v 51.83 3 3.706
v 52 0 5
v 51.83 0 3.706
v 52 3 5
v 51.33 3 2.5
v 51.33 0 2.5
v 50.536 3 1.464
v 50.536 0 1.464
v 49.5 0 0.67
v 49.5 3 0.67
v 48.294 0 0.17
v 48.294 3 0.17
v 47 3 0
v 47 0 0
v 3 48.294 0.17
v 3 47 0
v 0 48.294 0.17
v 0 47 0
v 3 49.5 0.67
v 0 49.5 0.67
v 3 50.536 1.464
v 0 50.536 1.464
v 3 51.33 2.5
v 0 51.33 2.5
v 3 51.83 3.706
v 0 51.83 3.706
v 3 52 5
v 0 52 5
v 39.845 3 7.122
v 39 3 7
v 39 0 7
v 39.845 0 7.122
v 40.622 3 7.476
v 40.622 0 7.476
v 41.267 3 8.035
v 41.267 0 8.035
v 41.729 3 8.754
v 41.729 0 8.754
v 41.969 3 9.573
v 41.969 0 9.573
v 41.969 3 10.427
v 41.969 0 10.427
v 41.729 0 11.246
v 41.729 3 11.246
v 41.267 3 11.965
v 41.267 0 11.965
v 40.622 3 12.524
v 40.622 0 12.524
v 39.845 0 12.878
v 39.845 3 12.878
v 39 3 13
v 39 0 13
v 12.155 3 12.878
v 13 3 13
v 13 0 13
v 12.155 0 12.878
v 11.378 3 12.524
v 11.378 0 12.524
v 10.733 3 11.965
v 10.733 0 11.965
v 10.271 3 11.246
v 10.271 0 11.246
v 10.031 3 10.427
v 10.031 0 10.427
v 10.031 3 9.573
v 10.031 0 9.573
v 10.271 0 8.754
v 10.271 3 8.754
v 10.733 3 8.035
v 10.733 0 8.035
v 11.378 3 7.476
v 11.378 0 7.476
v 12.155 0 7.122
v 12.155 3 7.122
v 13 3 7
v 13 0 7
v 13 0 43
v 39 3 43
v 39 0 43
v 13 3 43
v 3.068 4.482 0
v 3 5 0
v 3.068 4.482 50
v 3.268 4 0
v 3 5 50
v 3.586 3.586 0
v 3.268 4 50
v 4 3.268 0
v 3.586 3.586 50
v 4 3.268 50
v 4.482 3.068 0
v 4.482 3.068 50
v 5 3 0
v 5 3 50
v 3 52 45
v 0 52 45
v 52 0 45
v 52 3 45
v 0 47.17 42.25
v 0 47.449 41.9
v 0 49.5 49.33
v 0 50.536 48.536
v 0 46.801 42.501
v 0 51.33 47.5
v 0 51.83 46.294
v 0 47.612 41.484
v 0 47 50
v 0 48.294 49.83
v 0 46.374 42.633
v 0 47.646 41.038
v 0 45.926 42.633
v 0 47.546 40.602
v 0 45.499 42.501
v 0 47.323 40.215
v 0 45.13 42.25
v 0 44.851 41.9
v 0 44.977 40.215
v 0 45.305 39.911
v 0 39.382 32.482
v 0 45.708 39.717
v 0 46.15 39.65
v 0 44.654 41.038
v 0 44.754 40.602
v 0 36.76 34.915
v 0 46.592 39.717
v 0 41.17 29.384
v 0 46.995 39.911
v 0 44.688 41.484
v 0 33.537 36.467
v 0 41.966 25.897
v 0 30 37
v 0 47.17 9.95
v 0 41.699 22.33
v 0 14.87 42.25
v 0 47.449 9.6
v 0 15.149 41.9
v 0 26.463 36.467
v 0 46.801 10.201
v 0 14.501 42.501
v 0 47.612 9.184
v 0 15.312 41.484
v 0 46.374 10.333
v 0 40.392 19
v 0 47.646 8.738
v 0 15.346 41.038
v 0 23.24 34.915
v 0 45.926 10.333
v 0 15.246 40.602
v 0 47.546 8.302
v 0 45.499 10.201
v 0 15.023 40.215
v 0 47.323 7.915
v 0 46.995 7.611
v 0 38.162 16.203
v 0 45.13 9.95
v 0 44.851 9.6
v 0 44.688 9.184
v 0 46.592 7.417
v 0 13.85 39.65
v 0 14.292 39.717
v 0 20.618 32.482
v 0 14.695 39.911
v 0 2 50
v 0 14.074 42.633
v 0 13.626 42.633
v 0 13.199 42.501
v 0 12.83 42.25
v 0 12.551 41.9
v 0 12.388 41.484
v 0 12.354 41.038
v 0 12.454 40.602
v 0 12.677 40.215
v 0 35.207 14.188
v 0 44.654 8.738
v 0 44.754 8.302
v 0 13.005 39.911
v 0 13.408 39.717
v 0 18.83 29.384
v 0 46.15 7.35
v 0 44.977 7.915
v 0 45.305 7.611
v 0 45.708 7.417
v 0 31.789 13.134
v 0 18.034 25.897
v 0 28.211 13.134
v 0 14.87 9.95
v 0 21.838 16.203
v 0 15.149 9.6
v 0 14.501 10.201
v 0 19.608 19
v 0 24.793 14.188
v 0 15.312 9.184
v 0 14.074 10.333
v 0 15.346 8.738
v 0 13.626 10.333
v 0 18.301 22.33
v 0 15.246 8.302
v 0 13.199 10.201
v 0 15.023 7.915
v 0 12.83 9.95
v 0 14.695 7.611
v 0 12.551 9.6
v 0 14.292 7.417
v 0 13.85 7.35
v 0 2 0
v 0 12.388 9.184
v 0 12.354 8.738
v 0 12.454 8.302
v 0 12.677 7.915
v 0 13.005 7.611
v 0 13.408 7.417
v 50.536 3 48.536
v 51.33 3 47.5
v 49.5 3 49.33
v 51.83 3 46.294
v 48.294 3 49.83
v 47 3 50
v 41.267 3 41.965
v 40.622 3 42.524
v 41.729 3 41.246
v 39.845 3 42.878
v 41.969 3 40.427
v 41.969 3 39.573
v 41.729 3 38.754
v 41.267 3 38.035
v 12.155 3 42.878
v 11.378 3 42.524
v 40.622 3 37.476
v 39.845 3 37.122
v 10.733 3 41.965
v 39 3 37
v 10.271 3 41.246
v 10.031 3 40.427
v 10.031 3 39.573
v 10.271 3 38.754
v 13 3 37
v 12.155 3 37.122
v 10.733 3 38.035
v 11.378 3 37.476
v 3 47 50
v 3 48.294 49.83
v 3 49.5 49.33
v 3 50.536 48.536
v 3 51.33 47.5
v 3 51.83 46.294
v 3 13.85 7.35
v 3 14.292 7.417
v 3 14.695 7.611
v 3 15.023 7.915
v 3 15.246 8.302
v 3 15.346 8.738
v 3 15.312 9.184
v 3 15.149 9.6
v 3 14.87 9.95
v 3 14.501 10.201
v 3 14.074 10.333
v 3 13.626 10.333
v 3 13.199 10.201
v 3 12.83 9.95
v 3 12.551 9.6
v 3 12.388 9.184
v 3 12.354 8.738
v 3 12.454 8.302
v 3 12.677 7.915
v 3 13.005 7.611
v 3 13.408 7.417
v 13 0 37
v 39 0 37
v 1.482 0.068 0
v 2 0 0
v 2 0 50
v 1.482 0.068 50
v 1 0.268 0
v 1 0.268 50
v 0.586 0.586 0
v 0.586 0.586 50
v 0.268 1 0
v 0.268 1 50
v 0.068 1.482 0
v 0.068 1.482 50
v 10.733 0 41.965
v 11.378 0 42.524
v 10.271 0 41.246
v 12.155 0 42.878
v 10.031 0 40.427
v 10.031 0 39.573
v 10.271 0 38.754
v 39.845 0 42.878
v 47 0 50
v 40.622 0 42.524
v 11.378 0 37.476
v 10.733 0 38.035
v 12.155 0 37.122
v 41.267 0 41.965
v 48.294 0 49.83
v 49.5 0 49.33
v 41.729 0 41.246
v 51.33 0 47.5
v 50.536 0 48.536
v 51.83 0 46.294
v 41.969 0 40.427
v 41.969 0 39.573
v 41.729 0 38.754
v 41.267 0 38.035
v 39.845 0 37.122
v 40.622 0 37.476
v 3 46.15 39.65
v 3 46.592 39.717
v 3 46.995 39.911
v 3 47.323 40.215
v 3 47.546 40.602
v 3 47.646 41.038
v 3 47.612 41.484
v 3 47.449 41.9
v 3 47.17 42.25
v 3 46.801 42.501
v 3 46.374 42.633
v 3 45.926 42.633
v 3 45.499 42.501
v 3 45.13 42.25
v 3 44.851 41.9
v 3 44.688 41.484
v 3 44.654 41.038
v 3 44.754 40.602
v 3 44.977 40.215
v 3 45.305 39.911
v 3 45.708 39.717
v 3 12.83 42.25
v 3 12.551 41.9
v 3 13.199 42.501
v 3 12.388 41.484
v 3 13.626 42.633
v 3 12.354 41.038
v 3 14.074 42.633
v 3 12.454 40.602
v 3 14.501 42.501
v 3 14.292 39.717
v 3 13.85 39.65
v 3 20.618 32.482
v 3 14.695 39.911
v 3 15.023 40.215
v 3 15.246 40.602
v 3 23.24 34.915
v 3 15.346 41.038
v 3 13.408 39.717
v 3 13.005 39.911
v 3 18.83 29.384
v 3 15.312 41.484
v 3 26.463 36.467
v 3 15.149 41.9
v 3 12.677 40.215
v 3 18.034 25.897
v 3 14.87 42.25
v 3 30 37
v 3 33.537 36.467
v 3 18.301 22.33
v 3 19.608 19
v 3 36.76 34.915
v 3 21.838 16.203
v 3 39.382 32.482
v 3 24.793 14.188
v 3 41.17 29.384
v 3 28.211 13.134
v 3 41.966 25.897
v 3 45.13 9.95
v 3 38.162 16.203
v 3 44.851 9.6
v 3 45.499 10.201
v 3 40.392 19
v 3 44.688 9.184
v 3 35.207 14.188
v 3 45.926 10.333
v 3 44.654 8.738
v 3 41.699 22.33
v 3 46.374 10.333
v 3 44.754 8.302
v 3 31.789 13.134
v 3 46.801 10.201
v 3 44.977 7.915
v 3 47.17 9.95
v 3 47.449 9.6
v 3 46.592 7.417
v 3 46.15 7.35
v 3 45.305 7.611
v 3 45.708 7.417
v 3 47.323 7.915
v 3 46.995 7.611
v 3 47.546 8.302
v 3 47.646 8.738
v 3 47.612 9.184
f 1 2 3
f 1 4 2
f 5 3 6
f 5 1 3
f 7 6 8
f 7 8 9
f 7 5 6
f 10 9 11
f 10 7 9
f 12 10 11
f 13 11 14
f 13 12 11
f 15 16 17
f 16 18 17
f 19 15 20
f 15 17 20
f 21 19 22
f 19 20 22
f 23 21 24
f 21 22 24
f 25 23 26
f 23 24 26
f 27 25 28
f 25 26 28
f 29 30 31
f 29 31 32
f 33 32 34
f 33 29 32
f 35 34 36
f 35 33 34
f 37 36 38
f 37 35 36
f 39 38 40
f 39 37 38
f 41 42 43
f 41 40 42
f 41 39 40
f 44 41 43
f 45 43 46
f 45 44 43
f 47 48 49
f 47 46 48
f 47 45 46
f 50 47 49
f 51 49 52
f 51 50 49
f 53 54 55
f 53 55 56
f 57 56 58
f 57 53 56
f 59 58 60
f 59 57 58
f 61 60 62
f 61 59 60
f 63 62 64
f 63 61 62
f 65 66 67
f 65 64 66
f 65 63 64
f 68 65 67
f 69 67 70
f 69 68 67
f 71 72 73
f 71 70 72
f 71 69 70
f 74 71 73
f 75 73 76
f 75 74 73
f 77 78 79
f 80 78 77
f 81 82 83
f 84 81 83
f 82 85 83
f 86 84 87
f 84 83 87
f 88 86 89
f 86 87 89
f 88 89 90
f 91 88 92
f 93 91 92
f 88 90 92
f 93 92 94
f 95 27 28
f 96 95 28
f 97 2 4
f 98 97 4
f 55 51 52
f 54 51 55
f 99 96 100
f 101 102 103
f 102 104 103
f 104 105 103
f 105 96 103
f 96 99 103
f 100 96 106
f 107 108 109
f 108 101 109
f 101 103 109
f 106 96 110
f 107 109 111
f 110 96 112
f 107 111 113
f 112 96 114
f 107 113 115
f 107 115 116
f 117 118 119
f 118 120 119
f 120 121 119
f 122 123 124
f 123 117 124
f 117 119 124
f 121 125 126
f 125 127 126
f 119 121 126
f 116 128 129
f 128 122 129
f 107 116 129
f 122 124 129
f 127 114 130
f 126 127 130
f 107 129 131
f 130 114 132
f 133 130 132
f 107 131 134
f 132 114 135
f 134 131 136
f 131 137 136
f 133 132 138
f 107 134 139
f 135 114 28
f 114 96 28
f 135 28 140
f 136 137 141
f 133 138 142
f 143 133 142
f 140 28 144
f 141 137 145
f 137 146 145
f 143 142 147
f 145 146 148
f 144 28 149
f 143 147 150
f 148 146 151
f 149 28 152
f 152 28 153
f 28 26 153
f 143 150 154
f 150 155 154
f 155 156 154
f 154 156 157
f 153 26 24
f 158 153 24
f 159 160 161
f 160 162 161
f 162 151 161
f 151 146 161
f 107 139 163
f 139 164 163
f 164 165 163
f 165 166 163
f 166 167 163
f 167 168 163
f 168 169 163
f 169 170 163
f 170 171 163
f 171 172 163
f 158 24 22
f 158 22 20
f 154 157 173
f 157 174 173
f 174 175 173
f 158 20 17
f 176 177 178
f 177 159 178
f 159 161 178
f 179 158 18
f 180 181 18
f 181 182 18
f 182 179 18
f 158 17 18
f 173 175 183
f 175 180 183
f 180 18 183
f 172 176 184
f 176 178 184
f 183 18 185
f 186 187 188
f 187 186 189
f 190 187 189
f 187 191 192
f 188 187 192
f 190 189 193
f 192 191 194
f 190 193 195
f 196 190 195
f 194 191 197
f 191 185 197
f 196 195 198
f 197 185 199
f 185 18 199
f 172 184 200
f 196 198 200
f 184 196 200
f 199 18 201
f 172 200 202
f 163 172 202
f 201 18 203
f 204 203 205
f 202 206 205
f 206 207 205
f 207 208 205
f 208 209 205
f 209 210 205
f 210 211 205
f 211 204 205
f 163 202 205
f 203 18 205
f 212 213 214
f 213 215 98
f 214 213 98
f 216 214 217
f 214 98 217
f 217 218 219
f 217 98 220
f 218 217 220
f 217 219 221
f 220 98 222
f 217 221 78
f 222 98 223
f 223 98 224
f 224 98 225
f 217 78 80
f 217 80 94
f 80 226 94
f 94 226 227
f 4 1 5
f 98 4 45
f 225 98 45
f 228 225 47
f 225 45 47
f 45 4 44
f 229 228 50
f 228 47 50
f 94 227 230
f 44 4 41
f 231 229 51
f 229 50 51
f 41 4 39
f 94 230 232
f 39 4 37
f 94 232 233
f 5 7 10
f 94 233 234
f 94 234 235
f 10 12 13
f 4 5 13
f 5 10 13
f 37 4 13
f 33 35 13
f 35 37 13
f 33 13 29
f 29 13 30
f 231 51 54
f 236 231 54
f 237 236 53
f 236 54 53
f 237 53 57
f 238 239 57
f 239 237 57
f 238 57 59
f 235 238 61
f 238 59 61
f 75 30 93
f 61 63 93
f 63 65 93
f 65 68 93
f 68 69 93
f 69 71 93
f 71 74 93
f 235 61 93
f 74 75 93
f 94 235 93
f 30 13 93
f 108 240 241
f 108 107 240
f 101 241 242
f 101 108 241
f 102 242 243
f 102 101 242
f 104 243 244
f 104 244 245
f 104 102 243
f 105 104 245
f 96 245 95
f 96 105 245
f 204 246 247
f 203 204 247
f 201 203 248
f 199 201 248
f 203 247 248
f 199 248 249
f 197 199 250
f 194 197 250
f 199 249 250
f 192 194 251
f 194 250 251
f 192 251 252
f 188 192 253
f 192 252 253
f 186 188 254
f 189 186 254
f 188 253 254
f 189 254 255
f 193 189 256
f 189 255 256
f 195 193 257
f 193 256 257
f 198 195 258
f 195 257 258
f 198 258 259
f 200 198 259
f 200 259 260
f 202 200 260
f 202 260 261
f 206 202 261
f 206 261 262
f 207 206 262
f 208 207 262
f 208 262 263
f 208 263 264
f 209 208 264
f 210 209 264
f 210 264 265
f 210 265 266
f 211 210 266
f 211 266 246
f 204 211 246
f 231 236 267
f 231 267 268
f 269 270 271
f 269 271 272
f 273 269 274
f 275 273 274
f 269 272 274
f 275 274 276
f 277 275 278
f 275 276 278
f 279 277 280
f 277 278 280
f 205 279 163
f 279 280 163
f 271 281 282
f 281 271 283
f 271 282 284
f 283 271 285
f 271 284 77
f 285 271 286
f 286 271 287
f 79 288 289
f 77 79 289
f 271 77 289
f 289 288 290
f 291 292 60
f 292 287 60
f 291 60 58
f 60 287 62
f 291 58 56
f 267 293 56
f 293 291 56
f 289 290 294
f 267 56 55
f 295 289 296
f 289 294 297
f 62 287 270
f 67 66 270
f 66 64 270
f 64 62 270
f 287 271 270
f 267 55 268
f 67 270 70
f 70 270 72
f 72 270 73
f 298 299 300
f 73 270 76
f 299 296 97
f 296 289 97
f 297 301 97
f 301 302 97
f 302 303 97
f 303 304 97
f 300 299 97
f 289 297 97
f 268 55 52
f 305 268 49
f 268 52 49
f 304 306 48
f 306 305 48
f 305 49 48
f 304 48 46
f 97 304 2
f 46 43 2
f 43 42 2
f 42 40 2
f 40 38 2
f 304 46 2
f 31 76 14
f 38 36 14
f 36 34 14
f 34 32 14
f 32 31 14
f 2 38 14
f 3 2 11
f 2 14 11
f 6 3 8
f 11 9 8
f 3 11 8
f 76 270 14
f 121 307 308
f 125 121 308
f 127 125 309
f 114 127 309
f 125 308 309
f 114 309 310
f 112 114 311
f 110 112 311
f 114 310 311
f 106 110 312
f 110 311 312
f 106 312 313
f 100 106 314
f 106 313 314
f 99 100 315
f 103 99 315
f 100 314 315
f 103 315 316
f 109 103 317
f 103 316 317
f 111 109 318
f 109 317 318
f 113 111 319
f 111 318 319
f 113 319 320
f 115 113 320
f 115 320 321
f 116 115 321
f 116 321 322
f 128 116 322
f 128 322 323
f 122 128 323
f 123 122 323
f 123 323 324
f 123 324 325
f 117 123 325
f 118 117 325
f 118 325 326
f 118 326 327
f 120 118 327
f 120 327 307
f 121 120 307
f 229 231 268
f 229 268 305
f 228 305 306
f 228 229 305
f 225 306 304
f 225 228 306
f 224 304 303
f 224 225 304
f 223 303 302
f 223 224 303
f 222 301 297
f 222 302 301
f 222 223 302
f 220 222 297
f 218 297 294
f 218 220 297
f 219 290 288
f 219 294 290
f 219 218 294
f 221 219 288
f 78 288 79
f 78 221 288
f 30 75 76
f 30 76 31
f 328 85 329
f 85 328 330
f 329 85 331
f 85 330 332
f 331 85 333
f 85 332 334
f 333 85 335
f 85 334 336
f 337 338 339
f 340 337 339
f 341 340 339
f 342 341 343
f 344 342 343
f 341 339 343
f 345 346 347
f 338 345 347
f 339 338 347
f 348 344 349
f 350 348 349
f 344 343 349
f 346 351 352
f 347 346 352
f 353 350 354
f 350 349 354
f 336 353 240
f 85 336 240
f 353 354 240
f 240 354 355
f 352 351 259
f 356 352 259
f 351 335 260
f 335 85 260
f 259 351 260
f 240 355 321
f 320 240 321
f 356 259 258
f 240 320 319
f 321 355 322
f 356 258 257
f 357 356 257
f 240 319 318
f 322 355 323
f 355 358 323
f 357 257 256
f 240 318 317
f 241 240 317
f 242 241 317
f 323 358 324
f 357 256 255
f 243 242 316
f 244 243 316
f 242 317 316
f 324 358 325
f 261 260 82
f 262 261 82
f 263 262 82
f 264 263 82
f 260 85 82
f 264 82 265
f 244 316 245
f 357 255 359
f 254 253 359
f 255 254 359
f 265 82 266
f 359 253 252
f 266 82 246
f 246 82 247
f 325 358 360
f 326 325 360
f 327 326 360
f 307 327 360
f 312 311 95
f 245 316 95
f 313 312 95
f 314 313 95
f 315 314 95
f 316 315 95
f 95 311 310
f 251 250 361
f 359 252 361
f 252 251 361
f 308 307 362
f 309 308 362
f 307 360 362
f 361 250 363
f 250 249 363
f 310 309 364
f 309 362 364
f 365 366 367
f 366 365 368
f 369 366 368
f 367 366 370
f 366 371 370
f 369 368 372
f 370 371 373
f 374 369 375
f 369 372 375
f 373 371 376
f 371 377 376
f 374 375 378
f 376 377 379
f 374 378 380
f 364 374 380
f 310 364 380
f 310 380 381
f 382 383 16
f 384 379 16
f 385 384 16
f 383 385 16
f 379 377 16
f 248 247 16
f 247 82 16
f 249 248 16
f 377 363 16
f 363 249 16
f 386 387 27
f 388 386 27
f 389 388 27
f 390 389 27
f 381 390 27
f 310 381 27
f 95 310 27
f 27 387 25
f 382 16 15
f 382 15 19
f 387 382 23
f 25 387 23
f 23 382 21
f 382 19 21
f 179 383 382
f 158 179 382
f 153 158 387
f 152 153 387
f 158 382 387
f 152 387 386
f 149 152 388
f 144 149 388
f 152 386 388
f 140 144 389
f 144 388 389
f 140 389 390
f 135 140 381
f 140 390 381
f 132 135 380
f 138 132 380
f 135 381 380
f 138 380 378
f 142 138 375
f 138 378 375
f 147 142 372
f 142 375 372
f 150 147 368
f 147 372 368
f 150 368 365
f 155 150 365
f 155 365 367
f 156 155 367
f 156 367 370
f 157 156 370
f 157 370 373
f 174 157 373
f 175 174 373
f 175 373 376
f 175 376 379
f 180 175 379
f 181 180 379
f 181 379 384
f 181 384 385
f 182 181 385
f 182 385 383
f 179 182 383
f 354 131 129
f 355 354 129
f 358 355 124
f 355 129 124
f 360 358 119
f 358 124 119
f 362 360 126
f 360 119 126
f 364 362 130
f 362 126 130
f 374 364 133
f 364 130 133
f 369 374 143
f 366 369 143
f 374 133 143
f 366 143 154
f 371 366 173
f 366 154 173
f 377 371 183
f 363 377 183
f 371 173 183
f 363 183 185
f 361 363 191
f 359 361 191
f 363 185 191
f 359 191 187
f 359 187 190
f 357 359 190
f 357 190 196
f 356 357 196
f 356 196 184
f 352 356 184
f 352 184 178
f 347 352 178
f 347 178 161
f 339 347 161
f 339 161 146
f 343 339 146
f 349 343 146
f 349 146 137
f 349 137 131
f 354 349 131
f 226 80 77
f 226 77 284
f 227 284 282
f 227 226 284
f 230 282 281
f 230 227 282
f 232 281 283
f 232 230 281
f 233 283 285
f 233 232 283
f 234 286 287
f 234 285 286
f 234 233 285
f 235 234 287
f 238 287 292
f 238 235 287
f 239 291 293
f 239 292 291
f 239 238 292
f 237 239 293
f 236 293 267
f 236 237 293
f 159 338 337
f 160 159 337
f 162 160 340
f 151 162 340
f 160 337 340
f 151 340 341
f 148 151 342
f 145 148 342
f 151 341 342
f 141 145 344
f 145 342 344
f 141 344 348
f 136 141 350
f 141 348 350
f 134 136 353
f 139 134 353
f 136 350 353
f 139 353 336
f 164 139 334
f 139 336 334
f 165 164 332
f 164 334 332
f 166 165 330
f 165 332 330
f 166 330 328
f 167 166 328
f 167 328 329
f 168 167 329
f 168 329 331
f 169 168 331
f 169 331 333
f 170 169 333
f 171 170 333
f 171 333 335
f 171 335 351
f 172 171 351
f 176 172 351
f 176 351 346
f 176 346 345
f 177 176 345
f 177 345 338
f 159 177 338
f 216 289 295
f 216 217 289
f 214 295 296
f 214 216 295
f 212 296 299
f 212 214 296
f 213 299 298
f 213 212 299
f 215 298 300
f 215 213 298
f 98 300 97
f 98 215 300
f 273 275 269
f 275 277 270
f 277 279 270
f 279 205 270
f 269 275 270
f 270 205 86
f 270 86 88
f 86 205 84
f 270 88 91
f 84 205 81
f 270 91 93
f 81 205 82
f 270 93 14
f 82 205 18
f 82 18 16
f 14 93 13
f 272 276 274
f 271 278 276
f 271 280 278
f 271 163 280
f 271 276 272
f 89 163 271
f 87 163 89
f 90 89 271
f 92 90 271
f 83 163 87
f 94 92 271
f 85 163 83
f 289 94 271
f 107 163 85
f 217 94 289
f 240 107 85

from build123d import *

# Parameters (mm, degrees)
BOSS_EXTRUDE1_DEPTH = 50
FILLET1_R           = 2
FILLET2_R           = 5
FILLET3_R           = 5
FILLET4_R           = 5
FILLET5_R           = 5
FILLET6_R           = 2
CUT_EXTRUDE1_DEPTH  = 50
SKETCH3_R           = 12
CUT_EXTRUDE2_DEPTH  = 50
SKETCH4_R           = 1.5
CUT_EXTRUDE3_DEPTH  = 10


with BuildPart() as part:
    # Sketch1 → Boss-Extrude1 (new body)
    with BuildSketch(Plane.XY):
        Polygon((0, 0), (52, 0), (52, 3), (3, 3), (3, 52), (0, 52), align=None)
    extrude(amount=BOSS_EXTRUDE1_DEPTH)

    # Fillet1
    fillet1_edges = [part.edges().sort_by_distance(p)[0] for p in [
        (0, 0, 25),
    ]]
    fillet(fillet1_edges, radius=FILLET1_R)

    # Fillet2
    fillet2_edges = [part.edges().sort_by_distance(p)[0] for p in [
        (1.5, 52, 50),
    ]]
    fillet(fillet2_edges, radius=FILLET2_R)

    # Fillet3
    fillet3_edges = [part.edges().sort_by_distance(p)[0] for p in [
        (52, 1.5, 50),
    ]]
    fillet(fillet3_edges, radius=FILLET3_R)

    # Fillet4
    fillet4_edges = [part.edges().sort_by_distance(p)[0] for p in [
        (52, 1.5, 0),
    ]]
    fillet(fillet4_edges, radius=FILLET4_R)

    # Fillet5
    fillet5_edges = [part.edges().sort_by_distance(p)[0] for p in [
        (1.5, 52, 0),
    ]]
    fillet(fillet5_edges, radius=FILLET5_R)

    # Fillet6
    fillet6_edges = [part.edges().sort_by_distance(p)[0] for p in [
        (3, 3, 25),
    ]]
    fillet(fillet6_edges, radius=FILLET6_R)

    # Sketch2 → Cut-Extrude1 (cut)
    with BuildSketch(Plane(origin=(0, 3, 0), x_dir=(1, 0, 0), z_dir=(0, 1, 0))):
        with BuildLine():
            Line((39, -43), (13, -43))
            ThreePointArc((13, -43), (10, -40), (13, -37))
            Line((13, -37), (39, -37))
            ThreePointArc((39, -37), (42, -40), (39, -43))
        make_face()
        with BuildLine():
            Line((13, -7), (39, -7))
            ThreePointArc((39, -7), (42, -10), (39, -13))
            Line((39, -13), (13, -13))
            ThreePointArc((13, -13), (10, -10), (13, -7))
        make_face()
    extrude(amount=-CUT_EXTRUDE1_DEPTH, mode=Mode.SUBTRACT)

    # Sketch3 → Cut-Extrude2 (cut)
    with BuildSketch(Plane.ZY):
        with Locations((25, 30)):
            Circle(SKETCH3_R)
    extrude(amount=-CUT_EXTRUDE2_DEPTH, mode=Mode.SUBTRACT)

    # Sketch4 → Cut-Extrude3 (cut)
    with BuildSketch(Plane(origin=(3, 0, 0), x_dir=(0, 0, -1), z_dir=(1, 0, 0))):
        with Locations((-8.85, 46.15)):
            Circle(SKETCH4_R)
        with Locations((-41.15, 46.15)):
            Circle(SKETCH4_R)
        with Locations((-8.85, 13.85)):
            Circle(SKETCH4_R)
        with Locations((-41.15, 13.85)):
            Circle(SKETCH4_R)
    extrude(amount=-CUT_EXTRUDE3_DEPTH, mode=Mode.SUBTRACT)


solid = part.part
